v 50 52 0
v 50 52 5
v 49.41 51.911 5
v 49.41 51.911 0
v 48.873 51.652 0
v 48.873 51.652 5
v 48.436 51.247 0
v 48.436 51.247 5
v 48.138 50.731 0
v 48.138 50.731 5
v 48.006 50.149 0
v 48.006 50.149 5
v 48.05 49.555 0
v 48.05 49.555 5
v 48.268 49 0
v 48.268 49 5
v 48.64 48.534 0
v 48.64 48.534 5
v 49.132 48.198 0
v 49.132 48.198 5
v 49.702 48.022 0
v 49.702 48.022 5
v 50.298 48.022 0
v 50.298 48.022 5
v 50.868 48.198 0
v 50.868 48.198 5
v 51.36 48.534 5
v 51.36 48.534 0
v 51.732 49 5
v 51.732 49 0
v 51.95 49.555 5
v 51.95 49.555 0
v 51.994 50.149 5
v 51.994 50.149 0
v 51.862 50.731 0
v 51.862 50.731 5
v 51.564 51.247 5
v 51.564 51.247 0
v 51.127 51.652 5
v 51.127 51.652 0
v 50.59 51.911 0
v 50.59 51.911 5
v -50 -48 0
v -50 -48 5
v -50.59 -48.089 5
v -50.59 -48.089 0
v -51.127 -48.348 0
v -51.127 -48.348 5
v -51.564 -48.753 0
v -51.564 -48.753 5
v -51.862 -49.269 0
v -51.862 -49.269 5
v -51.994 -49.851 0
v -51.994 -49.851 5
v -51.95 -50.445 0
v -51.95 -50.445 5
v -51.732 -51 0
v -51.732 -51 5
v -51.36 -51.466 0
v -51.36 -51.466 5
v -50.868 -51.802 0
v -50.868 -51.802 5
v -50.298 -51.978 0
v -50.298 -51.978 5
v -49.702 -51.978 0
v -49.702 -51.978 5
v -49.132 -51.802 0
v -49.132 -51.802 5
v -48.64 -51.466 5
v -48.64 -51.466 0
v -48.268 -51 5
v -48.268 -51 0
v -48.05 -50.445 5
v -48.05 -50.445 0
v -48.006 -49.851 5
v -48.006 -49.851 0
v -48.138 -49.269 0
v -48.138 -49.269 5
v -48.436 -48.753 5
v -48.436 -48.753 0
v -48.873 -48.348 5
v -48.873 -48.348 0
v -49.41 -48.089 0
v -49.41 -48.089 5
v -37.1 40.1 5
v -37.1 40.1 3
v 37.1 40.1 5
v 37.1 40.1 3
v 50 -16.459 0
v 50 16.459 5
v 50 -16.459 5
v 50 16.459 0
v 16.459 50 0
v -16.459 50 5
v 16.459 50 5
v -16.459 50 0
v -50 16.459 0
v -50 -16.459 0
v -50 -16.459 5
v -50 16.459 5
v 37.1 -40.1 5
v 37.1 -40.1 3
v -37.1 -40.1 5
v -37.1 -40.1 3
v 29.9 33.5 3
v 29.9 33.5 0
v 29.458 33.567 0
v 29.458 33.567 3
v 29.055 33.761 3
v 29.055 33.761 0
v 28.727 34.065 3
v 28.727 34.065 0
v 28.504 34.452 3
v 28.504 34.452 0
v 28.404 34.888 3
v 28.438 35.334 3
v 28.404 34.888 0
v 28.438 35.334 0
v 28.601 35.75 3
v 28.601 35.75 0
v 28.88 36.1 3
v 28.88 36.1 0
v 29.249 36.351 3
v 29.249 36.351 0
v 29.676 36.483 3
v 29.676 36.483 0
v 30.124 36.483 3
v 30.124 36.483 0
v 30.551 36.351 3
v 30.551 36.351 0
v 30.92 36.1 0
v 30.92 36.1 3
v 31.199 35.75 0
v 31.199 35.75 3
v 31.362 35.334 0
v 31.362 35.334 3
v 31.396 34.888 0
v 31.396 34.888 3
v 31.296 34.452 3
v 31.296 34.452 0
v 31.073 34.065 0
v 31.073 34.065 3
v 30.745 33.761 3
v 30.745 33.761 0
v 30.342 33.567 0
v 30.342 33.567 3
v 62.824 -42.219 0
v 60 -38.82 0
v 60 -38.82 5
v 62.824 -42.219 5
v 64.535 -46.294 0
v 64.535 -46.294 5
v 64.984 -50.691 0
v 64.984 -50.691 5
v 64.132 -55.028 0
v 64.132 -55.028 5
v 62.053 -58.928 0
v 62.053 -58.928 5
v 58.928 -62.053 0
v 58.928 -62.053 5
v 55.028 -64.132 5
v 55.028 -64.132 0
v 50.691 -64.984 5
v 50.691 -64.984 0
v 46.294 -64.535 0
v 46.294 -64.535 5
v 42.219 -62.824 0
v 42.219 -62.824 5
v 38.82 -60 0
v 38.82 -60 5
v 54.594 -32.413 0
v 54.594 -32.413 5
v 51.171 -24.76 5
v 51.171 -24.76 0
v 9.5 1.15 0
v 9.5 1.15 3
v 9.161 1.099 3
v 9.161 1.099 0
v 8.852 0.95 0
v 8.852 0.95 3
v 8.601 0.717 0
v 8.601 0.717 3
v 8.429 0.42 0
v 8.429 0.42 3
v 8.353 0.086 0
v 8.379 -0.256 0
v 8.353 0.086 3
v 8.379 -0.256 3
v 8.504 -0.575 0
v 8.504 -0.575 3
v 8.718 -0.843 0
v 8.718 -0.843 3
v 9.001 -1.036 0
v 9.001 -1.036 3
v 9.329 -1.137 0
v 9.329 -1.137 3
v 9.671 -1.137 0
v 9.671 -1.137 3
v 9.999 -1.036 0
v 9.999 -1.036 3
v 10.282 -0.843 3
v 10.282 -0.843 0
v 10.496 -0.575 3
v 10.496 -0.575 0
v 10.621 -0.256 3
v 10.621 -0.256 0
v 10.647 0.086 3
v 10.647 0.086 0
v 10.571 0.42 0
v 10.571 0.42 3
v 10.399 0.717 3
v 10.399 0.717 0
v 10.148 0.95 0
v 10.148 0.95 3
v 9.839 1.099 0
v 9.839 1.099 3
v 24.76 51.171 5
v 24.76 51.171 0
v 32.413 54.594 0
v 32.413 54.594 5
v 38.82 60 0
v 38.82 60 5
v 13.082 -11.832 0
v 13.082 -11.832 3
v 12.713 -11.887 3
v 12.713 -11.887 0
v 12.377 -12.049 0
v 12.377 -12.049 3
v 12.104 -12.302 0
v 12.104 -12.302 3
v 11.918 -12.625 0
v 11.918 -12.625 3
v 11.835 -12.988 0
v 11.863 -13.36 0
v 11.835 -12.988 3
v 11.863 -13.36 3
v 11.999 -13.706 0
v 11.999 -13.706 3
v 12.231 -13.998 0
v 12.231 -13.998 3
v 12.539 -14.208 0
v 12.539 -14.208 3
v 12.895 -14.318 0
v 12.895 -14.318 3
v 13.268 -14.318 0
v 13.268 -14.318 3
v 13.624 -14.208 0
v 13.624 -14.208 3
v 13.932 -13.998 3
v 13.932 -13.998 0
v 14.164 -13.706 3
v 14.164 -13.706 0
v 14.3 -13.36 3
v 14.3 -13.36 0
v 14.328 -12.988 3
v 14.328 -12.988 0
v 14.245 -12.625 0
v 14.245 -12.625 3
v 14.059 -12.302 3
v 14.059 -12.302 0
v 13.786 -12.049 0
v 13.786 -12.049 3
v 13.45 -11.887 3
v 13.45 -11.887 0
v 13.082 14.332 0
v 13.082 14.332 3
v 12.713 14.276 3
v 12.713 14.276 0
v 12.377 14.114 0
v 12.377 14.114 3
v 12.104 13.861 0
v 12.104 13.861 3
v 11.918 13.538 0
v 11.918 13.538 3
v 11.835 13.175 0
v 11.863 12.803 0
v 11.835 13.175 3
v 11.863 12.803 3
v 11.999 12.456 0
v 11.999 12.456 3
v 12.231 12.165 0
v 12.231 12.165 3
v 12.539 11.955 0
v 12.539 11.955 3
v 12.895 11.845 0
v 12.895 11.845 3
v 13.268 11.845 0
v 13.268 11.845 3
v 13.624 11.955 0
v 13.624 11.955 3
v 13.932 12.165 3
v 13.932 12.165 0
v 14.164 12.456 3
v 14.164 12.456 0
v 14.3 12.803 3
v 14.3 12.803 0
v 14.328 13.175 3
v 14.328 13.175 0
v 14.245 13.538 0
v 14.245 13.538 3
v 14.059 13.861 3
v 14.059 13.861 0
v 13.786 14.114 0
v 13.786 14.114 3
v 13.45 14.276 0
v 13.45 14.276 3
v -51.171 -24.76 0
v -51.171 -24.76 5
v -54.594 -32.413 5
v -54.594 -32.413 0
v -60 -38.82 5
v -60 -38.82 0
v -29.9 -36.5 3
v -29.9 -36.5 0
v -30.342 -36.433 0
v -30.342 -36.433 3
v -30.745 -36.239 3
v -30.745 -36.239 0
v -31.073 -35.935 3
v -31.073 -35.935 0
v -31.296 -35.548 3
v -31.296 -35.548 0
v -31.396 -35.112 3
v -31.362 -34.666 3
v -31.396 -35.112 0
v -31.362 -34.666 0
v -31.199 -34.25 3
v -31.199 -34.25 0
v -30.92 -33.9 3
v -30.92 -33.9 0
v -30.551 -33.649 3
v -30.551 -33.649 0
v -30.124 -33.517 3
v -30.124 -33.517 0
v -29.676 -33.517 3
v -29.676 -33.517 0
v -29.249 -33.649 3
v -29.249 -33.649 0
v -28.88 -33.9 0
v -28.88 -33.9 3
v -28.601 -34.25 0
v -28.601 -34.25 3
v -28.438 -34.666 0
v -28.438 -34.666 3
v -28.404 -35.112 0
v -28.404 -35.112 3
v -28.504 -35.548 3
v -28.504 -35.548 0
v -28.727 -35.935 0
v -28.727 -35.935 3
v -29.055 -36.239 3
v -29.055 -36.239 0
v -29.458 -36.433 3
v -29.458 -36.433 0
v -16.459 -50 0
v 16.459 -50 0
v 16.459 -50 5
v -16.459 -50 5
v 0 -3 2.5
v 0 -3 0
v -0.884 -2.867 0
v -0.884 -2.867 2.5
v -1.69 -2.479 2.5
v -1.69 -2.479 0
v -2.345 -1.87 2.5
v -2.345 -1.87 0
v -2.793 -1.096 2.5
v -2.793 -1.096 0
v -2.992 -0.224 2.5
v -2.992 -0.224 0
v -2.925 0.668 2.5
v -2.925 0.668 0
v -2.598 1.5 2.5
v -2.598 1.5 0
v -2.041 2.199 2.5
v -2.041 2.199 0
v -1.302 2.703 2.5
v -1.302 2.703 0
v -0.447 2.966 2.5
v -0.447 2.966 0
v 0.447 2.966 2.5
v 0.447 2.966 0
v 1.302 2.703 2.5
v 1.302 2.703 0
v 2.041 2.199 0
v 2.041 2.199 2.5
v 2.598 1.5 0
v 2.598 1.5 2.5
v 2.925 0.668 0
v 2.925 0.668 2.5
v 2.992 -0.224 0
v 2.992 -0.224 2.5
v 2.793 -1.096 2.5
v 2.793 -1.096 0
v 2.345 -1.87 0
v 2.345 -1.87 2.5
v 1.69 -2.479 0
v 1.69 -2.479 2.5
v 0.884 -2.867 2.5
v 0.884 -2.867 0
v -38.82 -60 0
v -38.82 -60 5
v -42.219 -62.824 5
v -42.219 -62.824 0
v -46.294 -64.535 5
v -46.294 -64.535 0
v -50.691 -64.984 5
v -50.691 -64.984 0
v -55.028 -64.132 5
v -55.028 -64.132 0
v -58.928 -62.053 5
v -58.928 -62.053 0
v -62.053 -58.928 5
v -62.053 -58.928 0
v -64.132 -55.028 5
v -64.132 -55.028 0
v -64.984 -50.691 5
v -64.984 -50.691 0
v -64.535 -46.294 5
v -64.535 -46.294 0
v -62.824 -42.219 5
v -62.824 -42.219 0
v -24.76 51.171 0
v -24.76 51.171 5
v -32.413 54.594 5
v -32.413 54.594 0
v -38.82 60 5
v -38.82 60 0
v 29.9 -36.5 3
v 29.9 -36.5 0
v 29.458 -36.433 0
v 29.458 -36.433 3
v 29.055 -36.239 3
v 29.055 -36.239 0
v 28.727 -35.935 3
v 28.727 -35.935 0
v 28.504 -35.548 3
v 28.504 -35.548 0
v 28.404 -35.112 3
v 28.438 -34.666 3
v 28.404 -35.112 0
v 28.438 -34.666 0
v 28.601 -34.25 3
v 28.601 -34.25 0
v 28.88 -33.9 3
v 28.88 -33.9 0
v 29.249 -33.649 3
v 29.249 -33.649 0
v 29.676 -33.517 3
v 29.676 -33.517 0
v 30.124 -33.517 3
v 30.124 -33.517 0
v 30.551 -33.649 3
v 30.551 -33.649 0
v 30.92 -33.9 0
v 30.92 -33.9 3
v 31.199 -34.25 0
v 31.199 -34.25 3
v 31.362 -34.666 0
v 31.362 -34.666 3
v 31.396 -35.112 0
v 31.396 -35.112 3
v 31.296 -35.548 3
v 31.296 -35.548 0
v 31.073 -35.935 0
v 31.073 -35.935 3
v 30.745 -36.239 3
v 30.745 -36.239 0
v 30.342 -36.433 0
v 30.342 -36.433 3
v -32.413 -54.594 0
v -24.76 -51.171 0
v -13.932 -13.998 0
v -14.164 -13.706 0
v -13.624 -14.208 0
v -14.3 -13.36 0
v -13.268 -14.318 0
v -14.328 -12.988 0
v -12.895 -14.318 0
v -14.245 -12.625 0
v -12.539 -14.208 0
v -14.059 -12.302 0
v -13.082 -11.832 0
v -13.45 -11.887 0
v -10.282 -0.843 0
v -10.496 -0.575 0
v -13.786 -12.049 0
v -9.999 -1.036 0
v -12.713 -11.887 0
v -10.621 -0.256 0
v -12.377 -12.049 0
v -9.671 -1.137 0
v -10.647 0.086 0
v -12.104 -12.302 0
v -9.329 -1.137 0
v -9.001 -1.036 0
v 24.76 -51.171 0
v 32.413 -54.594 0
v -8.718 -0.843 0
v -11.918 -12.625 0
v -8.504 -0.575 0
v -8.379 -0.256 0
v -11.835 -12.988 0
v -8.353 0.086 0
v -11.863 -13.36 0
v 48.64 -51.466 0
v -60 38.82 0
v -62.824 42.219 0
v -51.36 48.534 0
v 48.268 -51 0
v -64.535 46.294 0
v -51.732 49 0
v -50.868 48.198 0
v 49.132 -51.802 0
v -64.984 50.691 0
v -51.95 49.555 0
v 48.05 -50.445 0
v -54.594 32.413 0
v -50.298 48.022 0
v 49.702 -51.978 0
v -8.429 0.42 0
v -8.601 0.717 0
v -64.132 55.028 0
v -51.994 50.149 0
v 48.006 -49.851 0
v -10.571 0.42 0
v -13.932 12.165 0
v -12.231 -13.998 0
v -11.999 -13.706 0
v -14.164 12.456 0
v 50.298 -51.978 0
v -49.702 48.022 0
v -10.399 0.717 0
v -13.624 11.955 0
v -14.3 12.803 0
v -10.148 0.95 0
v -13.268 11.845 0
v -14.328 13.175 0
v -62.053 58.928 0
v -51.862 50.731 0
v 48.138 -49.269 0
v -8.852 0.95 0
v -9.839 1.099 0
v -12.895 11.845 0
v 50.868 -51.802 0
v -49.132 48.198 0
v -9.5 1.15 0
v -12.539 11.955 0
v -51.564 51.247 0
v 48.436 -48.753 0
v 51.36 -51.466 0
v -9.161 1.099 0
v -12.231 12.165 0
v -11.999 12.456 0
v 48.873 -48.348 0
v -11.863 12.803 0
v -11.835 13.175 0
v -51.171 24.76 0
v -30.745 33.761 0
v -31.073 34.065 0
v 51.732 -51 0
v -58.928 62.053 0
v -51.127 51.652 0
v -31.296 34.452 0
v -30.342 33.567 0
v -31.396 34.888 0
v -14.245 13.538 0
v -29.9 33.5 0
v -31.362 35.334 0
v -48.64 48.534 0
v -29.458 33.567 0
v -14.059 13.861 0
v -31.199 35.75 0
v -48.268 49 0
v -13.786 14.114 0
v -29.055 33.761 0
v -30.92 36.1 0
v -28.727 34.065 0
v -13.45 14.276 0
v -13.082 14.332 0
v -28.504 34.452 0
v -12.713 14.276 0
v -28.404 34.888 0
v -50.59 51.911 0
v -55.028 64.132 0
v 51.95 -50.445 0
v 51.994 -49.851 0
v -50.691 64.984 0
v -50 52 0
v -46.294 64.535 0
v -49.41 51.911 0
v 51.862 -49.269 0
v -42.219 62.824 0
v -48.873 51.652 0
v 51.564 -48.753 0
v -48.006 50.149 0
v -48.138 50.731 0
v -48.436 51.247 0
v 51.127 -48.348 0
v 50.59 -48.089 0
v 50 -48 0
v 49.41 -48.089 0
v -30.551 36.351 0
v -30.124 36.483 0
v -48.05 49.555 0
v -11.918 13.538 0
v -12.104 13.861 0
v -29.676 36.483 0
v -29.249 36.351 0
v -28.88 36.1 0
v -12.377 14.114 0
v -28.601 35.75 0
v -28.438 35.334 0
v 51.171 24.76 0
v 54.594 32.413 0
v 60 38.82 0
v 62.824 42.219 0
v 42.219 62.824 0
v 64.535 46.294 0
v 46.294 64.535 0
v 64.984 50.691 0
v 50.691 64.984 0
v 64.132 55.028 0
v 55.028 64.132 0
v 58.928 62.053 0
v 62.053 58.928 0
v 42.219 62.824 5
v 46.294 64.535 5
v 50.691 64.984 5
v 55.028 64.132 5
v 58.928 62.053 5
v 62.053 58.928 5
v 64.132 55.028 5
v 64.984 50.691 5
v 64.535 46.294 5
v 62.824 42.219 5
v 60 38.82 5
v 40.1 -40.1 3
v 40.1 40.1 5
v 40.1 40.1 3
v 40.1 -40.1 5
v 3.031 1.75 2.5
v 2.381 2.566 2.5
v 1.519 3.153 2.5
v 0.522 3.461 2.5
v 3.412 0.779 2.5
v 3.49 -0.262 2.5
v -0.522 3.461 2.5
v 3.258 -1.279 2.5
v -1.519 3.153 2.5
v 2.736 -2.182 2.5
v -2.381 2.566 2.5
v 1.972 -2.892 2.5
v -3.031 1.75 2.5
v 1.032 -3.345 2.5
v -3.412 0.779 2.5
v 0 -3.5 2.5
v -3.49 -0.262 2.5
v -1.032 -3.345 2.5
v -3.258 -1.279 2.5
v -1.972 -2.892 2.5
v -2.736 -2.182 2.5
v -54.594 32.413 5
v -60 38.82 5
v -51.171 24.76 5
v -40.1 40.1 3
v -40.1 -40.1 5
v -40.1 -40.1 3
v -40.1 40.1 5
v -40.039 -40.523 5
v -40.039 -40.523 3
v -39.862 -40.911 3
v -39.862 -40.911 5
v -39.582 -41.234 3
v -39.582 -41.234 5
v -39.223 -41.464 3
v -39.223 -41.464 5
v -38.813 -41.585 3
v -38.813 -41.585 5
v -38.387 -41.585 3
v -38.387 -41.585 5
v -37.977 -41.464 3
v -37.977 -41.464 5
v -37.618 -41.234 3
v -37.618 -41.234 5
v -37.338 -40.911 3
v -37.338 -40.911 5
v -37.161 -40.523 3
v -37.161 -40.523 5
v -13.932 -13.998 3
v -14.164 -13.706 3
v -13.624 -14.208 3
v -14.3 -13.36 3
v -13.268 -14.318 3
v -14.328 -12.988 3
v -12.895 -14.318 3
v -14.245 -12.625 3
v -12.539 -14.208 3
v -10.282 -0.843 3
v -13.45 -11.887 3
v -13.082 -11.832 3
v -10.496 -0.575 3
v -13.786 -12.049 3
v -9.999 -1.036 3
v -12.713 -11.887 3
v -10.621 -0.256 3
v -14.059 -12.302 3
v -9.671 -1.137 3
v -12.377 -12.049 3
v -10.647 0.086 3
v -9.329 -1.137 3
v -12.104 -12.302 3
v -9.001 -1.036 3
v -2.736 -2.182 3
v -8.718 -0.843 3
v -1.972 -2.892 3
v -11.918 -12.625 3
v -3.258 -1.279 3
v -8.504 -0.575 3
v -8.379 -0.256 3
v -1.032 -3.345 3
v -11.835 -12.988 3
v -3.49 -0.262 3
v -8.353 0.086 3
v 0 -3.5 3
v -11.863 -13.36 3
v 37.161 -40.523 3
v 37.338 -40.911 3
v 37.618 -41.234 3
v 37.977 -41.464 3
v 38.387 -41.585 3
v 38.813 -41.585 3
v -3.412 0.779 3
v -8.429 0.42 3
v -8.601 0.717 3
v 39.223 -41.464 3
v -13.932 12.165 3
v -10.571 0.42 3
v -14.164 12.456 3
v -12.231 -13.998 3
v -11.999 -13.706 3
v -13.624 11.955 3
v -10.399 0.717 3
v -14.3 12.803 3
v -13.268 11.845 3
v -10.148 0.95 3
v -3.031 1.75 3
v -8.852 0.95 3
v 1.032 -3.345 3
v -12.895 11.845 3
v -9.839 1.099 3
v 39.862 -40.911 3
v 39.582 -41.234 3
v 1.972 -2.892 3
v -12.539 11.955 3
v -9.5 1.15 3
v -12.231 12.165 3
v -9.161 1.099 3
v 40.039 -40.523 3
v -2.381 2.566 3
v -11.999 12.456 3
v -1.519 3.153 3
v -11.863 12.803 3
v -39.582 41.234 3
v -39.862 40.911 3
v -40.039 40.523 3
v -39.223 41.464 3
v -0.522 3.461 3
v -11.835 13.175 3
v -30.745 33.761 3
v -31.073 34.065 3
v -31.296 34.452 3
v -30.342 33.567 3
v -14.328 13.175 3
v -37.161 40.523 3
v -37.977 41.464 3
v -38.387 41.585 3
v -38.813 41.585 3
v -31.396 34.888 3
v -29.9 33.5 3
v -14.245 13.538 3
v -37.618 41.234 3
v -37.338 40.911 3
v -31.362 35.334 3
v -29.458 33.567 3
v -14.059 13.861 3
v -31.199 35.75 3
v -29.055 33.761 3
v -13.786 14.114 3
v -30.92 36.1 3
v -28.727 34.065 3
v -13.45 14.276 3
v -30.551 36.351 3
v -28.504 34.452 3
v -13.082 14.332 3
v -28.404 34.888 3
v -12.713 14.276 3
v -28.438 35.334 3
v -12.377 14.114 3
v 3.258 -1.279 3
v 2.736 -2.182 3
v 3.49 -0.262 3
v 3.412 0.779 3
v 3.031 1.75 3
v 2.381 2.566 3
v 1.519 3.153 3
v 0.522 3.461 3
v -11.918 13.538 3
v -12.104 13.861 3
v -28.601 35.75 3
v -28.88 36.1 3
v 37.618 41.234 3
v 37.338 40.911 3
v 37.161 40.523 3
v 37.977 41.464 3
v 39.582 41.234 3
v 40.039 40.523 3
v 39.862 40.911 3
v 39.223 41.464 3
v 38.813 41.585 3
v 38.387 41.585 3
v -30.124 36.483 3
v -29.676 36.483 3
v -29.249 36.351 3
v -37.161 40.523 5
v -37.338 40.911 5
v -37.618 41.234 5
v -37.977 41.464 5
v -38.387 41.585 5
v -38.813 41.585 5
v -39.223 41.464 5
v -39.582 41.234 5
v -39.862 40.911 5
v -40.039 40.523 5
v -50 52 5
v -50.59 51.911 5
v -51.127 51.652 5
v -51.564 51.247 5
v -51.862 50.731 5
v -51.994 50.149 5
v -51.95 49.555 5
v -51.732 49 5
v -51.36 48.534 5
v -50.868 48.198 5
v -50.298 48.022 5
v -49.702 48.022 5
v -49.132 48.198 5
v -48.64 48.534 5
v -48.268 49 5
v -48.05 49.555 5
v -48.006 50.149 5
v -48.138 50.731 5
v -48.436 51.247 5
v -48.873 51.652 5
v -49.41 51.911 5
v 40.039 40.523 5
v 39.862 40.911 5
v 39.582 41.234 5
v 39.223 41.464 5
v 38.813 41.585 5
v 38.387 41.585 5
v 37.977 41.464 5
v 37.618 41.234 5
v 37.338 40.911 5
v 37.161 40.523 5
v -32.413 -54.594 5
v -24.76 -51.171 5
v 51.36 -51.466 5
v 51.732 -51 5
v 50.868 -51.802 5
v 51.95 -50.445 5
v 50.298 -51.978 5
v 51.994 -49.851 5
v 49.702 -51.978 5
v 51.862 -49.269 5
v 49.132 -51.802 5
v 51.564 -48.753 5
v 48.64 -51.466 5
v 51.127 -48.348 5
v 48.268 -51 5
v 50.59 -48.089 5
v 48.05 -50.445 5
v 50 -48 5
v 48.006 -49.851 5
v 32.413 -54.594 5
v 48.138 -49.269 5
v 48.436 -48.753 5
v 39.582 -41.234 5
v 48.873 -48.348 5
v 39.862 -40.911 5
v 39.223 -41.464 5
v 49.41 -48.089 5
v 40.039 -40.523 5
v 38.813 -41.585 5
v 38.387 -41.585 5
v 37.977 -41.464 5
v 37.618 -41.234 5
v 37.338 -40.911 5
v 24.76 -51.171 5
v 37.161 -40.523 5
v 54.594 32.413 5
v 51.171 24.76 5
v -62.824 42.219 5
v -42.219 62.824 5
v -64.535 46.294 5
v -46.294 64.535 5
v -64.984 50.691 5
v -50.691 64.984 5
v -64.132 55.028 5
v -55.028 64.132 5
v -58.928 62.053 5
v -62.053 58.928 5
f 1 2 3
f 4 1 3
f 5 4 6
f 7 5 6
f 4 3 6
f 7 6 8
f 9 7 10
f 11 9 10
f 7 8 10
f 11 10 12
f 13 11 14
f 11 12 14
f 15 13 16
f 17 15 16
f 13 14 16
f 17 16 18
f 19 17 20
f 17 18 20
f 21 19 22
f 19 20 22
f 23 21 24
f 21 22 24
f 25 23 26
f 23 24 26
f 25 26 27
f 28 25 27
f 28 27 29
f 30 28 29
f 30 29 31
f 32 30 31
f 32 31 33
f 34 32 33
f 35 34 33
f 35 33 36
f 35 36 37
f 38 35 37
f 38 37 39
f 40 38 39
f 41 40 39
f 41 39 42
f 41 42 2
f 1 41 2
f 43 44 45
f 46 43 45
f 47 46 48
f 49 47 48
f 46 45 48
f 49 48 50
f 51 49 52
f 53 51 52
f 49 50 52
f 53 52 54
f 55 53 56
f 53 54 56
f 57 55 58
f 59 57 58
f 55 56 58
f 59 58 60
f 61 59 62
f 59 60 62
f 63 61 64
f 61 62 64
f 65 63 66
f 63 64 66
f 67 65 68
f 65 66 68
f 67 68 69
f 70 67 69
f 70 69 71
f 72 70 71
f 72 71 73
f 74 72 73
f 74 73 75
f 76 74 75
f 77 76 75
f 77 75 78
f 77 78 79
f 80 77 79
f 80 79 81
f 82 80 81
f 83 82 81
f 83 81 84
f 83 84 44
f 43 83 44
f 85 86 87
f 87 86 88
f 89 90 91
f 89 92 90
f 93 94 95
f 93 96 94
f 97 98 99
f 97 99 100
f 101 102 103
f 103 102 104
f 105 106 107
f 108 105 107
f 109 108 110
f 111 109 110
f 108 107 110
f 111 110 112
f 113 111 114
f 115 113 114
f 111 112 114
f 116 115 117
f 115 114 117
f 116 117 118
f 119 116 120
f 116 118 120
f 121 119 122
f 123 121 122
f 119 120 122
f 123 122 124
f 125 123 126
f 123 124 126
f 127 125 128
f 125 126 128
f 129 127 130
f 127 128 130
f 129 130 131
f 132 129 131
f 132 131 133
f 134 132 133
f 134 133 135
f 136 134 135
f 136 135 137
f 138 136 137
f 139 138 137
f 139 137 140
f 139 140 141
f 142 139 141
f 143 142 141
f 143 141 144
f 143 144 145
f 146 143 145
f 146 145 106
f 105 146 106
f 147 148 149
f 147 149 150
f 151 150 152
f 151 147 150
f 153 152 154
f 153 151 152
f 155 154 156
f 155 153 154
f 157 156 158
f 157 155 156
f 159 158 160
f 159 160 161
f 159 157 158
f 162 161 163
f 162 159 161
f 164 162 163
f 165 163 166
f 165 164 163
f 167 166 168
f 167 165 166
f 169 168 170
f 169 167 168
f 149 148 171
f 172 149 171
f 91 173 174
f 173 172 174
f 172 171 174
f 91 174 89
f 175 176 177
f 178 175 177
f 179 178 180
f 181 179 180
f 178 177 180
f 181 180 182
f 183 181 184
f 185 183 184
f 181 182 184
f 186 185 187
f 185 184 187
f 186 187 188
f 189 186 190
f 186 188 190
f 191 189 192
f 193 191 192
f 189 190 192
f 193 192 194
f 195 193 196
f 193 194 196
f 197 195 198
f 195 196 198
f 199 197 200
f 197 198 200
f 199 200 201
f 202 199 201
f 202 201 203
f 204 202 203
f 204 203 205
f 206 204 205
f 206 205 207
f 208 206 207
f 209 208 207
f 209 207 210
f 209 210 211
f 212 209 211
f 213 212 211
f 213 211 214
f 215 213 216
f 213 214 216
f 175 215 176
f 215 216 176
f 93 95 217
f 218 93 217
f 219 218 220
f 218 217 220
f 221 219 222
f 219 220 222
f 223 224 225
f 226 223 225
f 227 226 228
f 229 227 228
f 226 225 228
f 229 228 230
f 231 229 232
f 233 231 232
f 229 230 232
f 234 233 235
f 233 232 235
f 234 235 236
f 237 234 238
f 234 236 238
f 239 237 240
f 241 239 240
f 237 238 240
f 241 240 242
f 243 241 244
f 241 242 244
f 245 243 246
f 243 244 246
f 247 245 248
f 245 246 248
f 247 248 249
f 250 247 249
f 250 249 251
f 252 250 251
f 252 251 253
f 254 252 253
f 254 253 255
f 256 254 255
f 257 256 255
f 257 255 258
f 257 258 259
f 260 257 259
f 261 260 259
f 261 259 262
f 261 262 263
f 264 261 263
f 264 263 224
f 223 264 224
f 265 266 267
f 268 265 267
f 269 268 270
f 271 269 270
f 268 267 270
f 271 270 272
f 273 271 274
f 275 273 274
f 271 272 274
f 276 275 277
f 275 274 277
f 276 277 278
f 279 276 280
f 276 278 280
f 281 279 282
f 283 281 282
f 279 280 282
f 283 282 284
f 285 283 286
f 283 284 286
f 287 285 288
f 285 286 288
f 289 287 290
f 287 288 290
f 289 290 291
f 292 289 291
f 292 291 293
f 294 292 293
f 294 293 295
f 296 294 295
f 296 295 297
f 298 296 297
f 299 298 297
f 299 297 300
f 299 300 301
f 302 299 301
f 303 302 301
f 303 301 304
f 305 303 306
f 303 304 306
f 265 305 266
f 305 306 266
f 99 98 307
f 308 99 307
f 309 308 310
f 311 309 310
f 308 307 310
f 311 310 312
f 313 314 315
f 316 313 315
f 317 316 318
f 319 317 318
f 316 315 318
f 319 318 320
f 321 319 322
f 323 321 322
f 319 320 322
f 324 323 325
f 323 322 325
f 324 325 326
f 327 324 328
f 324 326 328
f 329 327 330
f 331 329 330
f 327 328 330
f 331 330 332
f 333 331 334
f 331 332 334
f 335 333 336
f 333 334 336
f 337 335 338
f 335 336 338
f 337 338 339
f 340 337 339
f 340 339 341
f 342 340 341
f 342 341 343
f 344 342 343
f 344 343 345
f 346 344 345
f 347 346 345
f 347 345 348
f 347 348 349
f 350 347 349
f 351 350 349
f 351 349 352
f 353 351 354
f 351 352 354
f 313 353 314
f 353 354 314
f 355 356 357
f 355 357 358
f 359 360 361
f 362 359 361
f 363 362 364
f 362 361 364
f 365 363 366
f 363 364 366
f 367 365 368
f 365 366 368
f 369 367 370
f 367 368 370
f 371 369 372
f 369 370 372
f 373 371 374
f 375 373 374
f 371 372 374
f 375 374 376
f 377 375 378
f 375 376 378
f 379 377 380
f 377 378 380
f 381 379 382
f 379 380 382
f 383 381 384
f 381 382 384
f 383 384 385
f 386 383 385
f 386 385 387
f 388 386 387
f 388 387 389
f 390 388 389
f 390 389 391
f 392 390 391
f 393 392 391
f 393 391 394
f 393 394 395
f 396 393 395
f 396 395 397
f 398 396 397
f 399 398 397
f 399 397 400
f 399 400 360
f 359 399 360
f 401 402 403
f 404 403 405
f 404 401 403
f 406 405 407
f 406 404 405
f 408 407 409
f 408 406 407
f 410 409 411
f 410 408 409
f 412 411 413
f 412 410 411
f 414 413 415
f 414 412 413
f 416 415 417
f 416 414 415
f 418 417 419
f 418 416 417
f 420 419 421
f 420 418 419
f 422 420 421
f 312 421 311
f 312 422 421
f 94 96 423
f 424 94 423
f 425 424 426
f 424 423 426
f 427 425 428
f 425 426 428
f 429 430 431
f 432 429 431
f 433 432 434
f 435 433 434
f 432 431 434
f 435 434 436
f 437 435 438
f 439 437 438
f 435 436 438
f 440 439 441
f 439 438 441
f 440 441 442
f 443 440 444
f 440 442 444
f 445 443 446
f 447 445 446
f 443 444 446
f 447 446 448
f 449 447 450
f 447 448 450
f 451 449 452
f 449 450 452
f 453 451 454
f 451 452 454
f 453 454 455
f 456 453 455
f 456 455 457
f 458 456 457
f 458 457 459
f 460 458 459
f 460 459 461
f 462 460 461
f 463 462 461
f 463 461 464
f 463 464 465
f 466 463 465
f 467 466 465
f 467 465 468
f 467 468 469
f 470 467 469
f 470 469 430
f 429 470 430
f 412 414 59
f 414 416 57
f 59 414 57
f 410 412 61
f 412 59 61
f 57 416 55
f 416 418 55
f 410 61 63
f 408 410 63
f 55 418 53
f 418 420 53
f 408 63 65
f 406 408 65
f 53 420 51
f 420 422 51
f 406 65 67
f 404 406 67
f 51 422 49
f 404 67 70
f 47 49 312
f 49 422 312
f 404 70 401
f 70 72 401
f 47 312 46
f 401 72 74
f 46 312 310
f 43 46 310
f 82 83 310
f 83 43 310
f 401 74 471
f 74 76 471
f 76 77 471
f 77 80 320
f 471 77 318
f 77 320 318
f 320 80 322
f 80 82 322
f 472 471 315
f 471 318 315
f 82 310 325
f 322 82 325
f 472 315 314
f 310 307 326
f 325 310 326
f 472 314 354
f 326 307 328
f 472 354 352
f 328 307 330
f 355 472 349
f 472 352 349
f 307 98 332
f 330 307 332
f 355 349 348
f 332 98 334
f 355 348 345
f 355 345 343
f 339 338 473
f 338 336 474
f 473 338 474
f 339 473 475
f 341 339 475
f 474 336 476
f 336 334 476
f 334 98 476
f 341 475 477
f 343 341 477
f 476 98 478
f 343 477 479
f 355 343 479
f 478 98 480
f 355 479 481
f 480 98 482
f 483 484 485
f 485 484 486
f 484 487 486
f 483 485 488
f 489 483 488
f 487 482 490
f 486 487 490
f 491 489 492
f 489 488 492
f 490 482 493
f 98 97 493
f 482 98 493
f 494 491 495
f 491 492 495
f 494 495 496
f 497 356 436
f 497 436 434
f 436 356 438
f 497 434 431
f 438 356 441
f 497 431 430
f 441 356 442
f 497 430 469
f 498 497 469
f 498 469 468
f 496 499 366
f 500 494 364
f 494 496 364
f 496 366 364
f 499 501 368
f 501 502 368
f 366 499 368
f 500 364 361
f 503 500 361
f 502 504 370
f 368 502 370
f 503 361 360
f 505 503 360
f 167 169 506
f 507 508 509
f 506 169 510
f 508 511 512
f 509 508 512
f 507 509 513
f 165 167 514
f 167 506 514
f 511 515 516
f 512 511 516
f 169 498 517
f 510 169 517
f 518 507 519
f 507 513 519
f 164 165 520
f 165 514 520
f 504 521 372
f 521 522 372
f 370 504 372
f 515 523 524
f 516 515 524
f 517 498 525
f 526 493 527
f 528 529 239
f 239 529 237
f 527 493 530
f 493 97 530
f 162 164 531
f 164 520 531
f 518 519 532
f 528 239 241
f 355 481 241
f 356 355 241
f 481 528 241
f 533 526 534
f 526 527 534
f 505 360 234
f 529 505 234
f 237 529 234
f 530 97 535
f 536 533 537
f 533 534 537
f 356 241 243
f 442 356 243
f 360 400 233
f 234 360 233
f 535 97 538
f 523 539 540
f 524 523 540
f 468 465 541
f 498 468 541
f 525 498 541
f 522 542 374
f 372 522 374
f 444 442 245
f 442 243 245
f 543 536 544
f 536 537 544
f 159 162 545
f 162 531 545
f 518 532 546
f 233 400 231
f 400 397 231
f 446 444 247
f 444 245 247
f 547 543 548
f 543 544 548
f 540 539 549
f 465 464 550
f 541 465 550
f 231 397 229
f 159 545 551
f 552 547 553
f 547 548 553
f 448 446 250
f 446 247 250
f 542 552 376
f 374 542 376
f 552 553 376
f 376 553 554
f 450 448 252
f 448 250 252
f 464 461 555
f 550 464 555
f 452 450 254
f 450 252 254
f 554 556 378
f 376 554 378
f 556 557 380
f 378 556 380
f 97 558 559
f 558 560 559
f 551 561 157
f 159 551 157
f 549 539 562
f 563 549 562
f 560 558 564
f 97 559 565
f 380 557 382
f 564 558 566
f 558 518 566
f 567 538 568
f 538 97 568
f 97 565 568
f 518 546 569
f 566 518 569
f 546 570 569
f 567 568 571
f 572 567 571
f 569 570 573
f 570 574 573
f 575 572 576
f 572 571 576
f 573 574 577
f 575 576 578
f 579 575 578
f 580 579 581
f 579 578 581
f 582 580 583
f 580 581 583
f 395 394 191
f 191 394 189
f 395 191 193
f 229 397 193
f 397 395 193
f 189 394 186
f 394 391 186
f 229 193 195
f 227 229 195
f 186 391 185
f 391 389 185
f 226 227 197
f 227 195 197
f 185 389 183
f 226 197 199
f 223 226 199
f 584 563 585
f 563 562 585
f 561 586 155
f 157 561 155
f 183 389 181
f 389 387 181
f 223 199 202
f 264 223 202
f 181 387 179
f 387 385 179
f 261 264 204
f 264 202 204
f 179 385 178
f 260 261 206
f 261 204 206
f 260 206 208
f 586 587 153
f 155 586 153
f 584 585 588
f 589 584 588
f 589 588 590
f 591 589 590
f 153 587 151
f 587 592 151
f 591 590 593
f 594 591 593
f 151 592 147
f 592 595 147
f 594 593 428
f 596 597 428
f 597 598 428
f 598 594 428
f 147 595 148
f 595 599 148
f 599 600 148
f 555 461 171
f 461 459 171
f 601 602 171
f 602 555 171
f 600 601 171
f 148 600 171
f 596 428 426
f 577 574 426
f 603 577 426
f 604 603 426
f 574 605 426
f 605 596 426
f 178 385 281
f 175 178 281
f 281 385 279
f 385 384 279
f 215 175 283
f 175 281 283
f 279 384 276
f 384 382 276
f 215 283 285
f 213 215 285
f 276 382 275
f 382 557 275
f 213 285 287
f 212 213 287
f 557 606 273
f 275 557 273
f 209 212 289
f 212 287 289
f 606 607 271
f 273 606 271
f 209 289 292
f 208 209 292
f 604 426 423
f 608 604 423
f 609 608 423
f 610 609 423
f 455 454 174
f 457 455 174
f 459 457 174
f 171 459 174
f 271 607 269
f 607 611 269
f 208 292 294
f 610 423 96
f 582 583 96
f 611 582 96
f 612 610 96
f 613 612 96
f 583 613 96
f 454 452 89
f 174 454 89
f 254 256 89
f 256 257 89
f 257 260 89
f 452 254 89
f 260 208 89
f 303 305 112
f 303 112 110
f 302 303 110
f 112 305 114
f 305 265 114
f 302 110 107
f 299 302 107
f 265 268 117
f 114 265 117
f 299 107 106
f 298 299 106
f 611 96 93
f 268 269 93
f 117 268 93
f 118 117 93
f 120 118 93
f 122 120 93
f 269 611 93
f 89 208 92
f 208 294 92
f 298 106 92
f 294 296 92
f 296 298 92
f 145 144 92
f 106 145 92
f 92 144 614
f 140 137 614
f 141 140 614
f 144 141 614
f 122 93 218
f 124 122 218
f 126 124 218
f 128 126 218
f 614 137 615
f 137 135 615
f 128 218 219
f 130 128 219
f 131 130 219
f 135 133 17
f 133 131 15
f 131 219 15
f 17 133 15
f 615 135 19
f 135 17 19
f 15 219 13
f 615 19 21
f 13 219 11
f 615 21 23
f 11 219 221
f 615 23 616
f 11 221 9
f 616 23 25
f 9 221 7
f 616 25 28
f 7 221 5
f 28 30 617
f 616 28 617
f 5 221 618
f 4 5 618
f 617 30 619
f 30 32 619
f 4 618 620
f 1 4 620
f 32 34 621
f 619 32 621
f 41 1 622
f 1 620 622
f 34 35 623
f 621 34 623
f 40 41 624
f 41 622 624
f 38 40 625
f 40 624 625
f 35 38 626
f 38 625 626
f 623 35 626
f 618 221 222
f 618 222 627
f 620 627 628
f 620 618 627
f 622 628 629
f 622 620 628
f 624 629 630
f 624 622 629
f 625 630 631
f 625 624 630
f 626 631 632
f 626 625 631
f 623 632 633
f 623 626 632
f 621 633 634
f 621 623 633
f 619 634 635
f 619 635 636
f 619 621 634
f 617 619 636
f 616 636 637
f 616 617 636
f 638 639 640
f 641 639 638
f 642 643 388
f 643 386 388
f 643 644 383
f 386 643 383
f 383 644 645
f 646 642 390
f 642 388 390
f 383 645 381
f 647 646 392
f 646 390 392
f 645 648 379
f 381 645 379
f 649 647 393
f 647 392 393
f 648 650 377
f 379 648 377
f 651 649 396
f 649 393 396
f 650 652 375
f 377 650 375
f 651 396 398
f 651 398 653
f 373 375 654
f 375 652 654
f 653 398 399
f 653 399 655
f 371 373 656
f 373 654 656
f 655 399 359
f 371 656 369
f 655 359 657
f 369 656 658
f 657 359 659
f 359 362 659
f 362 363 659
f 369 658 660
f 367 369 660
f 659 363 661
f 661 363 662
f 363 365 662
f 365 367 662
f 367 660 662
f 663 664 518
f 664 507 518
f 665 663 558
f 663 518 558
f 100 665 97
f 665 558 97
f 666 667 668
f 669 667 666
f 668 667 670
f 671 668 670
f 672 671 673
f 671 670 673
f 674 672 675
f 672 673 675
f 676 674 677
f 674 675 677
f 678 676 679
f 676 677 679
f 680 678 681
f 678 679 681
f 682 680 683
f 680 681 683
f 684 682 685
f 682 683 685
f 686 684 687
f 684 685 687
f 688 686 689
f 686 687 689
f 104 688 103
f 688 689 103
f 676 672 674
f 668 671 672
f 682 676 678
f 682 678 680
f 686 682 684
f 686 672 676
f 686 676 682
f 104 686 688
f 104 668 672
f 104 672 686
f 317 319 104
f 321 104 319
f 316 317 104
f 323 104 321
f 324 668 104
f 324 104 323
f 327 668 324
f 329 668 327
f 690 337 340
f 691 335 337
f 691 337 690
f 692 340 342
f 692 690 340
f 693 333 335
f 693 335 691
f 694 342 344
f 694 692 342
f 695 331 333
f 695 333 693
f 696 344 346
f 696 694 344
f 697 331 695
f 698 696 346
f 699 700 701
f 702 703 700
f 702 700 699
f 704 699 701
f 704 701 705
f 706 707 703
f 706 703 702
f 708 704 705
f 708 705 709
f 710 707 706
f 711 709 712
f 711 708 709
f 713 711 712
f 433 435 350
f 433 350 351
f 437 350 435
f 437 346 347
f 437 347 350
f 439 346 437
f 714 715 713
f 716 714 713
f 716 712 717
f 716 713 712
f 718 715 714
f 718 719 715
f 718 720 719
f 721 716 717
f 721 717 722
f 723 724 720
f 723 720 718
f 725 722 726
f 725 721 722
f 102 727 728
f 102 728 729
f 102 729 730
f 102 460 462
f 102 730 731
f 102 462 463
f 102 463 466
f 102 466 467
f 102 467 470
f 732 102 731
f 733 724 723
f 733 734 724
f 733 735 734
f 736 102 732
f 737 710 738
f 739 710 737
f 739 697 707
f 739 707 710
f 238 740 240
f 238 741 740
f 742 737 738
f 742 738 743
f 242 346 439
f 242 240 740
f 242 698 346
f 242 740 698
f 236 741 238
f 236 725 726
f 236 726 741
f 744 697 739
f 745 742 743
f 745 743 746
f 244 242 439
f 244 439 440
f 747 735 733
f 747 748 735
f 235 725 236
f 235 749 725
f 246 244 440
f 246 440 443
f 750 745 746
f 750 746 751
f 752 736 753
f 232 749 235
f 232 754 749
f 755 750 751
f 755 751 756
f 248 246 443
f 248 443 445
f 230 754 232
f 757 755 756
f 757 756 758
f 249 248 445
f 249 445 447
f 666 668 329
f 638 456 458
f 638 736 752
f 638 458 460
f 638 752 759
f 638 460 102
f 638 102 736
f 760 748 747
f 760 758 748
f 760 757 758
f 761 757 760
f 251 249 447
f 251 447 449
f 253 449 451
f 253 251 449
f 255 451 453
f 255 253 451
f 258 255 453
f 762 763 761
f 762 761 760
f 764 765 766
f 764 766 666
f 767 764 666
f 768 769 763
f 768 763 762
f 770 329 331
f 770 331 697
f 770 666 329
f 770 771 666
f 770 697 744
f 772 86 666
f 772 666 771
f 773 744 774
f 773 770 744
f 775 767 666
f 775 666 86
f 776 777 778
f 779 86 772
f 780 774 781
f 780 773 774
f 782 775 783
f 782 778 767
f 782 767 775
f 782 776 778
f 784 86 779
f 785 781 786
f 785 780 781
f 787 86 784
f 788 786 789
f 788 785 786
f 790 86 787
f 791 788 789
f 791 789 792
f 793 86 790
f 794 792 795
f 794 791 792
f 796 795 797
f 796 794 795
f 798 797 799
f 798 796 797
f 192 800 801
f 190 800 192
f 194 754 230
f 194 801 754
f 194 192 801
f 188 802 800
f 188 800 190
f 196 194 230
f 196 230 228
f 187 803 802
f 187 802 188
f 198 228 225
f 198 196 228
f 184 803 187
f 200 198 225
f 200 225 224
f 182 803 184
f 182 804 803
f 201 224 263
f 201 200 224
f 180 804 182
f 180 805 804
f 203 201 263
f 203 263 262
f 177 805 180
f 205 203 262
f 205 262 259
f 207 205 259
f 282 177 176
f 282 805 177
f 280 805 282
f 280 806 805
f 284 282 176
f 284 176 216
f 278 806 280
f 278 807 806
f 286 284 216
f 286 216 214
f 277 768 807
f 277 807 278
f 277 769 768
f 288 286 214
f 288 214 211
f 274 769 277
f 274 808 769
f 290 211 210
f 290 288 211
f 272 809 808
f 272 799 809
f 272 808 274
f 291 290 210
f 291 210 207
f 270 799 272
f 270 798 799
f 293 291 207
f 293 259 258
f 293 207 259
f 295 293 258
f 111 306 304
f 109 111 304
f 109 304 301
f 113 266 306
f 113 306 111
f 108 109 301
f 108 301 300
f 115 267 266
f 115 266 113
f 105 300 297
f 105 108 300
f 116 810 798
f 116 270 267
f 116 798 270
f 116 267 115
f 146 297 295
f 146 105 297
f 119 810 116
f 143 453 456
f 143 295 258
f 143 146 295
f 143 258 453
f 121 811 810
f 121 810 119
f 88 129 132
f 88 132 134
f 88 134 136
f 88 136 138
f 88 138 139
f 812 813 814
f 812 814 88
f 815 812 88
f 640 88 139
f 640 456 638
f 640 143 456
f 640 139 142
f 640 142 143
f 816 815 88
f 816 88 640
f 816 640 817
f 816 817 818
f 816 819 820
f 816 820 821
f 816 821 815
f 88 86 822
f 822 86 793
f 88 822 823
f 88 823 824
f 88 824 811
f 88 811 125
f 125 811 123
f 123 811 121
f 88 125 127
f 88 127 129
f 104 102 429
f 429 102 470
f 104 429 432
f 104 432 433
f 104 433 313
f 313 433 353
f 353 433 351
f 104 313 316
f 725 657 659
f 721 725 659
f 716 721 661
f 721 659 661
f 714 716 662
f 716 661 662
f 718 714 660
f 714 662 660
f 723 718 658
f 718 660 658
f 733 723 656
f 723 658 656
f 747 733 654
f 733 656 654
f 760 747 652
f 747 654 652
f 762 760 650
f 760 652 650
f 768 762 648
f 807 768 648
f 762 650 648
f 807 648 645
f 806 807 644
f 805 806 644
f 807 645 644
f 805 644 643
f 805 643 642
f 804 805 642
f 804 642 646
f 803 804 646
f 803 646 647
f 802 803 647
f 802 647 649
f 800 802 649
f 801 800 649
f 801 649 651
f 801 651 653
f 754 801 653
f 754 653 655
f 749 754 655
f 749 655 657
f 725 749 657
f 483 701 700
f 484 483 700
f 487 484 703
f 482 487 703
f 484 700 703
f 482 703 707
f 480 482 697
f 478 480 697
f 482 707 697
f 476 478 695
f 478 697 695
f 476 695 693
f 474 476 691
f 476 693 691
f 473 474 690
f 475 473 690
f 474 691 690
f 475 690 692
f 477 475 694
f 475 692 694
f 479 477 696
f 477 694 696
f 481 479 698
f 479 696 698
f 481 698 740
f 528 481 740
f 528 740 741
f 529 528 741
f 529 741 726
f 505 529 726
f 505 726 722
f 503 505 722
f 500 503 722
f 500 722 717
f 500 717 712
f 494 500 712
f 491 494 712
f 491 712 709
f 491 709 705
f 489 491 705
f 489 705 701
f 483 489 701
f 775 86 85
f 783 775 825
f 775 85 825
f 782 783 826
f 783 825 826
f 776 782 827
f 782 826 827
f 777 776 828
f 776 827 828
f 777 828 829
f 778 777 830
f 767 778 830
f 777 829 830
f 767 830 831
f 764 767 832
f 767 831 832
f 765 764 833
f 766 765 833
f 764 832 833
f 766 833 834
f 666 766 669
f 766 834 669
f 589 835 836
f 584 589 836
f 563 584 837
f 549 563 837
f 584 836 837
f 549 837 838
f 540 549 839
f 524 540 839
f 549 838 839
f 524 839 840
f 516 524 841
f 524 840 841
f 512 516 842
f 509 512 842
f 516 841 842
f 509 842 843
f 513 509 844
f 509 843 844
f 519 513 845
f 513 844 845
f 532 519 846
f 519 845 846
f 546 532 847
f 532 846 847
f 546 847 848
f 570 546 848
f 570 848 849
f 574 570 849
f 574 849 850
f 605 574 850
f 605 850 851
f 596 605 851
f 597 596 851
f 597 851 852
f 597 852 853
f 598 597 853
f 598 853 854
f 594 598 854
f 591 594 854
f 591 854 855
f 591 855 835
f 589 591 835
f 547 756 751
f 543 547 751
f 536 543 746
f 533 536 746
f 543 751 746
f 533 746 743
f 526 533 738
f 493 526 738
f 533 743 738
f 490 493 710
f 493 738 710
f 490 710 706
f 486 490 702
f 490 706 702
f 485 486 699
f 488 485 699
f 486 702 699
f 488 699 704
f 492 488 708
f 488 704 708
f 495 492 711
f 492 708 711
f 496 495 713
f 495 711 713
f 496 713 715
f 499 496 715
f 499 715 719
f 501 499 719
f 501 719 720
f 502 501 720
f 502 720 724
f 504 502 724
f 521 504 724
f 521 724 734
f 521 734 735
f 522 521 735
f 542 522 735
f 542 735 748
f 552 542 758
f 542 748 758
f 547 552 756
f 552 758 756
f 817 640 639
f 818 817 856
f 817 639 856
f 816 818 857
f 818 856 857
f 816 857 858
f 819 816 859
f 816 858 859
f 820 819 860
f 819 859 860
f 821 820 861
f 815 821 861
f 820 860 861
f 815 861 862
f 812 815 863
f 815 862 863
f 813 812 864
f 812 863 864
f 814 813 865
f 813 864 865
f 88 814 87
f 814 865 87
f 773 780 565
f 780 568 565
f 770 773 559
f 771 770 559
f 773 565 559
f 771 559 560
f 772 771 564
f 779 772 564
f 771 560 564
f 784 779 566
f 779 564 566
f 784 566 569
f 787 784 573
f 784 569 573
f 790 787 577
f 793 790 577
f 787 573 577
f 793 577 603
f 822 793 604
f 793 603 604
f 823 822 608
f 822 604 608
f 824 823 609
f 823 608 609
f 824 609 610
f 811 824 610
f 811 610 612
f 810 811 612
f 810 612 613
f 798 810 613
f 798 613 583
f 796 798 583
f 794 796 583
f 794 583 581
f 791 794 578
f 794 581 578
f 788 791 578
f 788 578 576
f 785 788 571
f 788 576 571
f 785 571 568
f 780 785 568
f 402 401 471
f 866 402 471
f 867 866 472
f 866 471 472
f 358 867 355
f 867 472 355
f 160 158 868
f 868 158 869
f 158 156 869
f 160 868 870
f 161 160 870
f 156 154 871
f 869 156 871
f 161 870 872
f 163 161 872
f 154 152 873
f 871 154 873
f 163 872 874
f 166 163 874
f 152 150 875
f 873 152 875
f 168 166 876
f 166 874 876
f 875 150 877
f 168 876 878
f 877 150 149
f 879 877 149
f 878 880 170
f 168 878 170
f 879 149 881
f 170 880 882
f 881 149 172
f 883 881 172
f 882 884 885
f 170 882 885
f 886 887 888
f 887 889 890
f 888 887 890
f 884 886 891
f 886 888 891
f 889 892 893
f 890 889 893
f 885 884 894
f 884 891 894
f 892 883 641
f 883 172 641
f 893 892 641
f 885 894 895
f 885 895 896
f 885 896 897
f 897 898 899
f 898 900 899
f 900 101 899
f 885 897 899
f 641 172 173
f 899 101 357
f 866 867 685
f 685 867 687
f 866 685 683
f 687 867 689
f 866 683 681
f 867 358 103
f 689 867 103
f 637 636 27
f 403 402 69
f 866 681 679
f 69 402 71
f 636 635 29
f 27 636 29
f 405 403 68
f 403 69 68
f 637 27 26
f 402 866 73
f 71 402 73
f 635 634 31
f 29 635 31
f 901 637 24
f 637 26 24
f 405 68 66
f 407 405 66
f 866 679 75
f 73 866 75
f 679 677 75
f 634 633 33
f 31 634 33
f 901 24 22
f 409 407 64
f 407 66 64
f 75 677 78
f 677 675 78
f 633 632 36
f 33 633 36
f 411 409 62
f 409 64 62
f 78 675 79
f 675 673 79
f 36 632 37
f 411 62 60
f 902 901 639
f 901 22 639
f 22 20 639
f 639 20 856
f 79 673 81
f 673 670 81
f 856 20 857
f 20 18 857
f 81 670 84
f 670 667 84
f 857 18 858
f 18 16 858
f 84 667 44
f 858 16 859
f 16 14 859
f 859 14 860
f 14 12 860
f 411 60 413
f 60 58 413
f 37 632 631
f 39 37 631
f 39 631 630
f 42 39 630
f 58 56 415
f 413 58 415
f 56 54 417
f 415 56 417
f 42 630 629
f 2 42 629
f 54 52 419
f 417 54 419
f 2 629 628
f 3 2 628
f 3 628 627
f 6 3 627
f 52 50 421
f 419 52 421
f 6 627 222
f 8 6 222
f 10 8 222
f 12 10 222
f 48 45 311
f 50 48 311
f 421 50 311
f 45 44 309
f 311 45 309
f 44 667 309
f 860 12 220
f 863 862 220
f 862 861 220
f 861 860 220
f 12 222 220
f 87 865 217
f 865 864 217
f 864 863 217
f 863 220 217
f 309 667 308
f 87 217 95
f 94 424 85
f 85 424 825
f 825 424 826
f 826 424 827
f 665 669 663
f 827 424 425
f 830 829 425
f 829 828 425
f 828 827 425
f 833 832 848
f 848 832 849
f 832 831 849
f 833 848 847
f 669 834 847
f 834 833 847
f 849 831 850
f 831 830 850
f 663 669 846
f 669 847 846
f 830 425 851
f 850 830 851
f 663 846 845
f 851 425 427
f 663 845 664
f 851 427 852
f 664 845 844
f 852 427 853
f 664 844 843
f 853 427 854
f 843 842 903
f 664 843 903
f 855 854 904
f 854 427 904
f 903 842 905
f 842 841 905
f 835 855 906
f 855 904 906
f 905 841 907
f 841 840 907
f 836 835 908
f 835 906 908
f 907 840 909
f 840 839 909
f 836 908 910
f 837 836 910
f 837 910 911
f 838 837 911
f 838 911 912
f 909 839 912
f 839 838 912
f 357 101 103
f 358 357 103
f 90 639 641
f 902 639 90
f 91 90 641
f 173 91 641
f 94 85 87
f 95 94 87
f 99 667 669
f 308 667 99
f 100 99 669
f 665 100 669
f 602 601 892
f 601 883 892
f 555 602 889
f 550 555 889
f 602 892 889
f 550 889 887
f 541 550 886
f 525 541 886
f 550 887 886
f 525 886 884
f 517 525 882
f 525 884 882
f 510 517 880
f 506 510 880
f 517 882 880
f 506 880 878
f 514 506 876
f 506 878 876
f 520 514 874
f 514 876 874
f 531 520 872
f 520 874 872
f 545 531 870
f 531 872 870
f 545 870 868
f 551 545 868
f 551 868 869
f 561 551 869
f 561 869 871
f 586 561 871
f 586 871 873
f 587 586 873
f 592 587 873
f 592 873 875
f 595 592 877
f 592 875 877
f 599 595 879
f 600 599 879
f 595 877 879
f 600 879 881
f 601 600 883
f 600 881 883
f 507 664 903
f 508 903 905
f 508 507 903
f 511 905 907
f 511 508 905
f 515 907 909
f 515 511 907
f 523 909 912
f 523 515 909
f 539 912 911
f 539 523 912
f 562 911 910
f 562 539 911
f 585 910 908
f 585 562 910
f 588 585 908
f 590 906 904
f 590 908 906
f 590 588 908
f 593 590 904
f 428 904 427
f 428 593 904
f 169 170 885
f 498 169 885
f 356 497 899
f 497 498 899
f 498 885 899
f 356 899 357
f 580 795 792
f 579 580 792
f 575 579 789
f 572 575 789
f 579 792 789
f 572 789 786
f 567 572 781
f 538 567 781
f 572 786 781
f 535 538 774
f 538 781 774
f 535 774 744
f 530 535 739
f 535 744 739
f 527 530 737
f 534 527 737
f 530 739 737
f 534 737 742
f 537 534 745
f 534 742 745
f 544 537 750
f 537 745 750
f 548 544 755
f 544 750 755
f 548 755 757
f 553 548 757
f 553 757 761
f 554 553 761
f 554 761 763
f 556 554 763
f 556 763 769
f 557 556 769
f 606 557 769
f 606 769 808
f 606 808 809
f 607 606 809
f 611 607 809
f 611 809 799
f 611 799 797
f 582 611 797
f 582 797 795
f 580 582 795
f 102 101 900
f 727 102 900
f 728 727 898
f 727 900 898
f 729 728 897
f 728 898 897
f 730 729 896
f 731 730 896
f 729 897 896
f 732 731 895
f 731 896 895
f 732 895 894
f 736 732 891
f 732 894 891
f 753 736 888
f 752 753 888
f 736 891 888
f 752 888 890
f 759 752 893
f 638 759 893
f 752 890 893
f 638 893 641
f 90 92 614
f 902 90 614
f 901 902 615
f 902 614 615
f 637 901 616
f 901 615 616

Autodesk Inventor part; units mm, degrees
ref_plane "YZ Plane" through (0, 0, 0) normal (1, 0, 0) x (0, 1, 0)
ref_plane "XZ Plane" through (0, 0, 0) normal (0, 1, 0) x (-1, 0, 0)
ref_plane "XY Plane" through (0, 0, 0) normal (0, 0, 1) x (1, 0, 0)
sketch "スケッチ1" plane through (0, 0, 0) normal (0, 0, 1) x (1, 0, 0)
  line L0 (-50, 50) -> (50, 50)
  line L1 (50, 50) -> (50, -50)
  line L2 (50, -50) -> (-50, -50)
  line L3 (-50, -50) -> (-50, 50)
  point P0 (0, 0)
  dimension "d0" = 100
  dimension "d1" = 100
  dimension "d2" = 50
  dimension "d3" = 50
extrude "押し出し1" add sketch "スケッチ1" along normal blind 3
sketch "スケッチ2" plane through (0, 0, 3) normal (0, 0, 1) x (1, 0, 0)
  point P0 (0, 0)
  point P1 (0, 0)
hole "Hole1" at (0, 0, 3) direction (0, 0, -1) diameter 6 end through all counterbore diameter 7 counterbore depth 0.5
sketch "スケッチ3" plane through (0, 0, 3) normal (0, 0, 1) x (1, 0, 0)
  circle A0 centre (0, 0) radius 3.5 projected
  line L0 (50, 50) -> (50, -50) projected
  line L1 (-50, 50) -> (50, 50) projected
  line L2 (-50, -50) -> (-50, 50) projected
  line L3 (50, -50) -> (-50, -50) projected
  line L4 (-40.1, 40.1) -> (40.1, 40.1)
  line L5 (40.1, 40.1) -> (40.1, -40.1)
  line L6 (40.1, -40.1) -> (-40.1, -40.1)
  line L7 (-40.1, -40.1) -> (-40.1, 40.1)
  dimension "d13" = 80.2
  dimension "d14" = 80.2
  dimension "d15" = 40.1
  dimension "d16" = 40.1
extrude "押し出し2" add sketch "スケッチ3" along normal blind 2 contours L0 L3 L2 L1
sketch "スケッチ4" plane through (0, 0, 3) normal (0, 0, 1) x (1, 0, 0)
  circle A0 centre (0, 0) radius 3.5 projected
  point P0 (-29.9, 35)
  point P1 (-29.9, -35)
  point P2 (29.9, -35)
  point P3 (29.9, 35)
  dimension "d19" = 59.8
  dimension "d20" = 59.8
  dimension "d21" = 70
  dimension "d22" = 70
  dimension "d23" = 29.9
  dimension "d24" = 29.9
  dimension "d25" = 35
hole "Hole2" at (29.9, -35, 3) at (-29.9, -35, 3) at (29.9, 35, 3) at (-29.9, 35, 3) direction (0, 0, -1) diameter 3 depth 8 tip angle 118
sketch "スケッチ5" plane through (0, 0, 0) normal (0, 0, -1) x (-1, 0, 0)
  circle A0 centre (-50, -50) radius 15
  circle A1 centre (-50, 50) radius 15
  circle A2 centre (50, -50) radius 15
  circle A3 centre (50, 50) radius 15
  dimension "d33" = 30
  dimension "d34" = 30
  dimension "d35" = 30
  dimension "d36" = 30
extrude "押し出し3" add sketch "スケッチ5" against normal blind 5
fillet "フィレット1" radius 30 8 edges at (-35, 50, 2.5) (-50, 35, 2.5) (35, 50, 2.5) (50, 35, 2.5) (50, -35, 2.5) (35, -50, 2.5) (-35, -50, 2.5) (-50, -35, 2.5)
sketch "スケッチ6" plane through (0, 0, 0) normal (0, 0, -1) x (-1, 0, 0)
  arc A0 (60, 38.8197) -> (38.8197, 60) centre (50, 50) ccw projected
  arc A1 (-38.8197, 60) -> (-60, 38.8197) centre (-50, 50) ccw projected
  arc A2 (-60, -38.8197) -> (-38.8197, -60) centre (-50, -50) ccw projected
  arc A3 (38.8197, -60) -> (60, -38.8197) centre (50, -50) ccw projected
hole "Hole3" at (-50, -50, 0) at (50, -50, 0) at (50, 50, 0) at (-50, 50, 0) direction (0, 0, 1) diameter 4 depth 8 tip angle 118
sketch "スケッチ7" plane through (0, 0, 5) normal (0, 0, 1) x (1, 0, 0)
  arc A0 (-38.731, -40.1) -> (-40.1, -38.731) centre (-50, -50) ccw projected
  line L0 (-40.1, -38.731) -> (-40.1, 38.731) projected
  arc A1 (-40.1, 38.731) -> (-38.731, 40.1) centre (-50, 50) ccw projected
  line L1 (-38.731, 40.1) -> (38.731, 40.1) projected
  arc A2 (38.731, 40.1) -> (40.1, 38.731) centre (50, 50) ccw projected
  line L2 (40.1, 38.731) -> (40.1, -38.731) projected
  arc A3 (40.1, -38.731) -> (38.731, -40.1) centre (50, -50) ccw projected
  line L3 (38.731, -40.1) -> (-38.731, -40.1) projected
  circle A4 centre (-38.6, 40.1) radius 1.5
  line L4 (38.731, 40.1) -> (-38.731, 40.1) projected
  line L5 (0, 40.1) -> (0, -40.1)
  line L6 (40.1, 0) -> (-40.1, 0)
  circle A5 centre (38.6, 40.1) radius 1.5
  circle A6 centre (-38.6, -40.1) radius 1.5
  circle A7 centre (38.6, -40.1) radius 1.5
  line L7 (-40.1, 40.1) -> (40.1, 40.1)
  line L8 (40.1, 40.1) -> (40.1, -40.1)
  line L9 (40.1, -40.1) -> (-40.1, -40.1)
  line L10 (-40.1, -40.1) -> (-40.1, 40.1)
  point P0 (0, 0)
  dimension "d47" = 3
  dimension "d48" = 1.5
extrude "押し出し4" cut sketch "スケッチ7" against normal up to surface (2 mm away) contours L9 A6 A0 | A0 A6 L3 | L3 A6 L9 | A6 L10 A0 | A7 A3 L3 | L3 L9 A7 | L10 A4 A1 | A3 A7 L9 | A3 L8 A7 | A4 L7 A1 | A1 L1 A4 | A4 L1 L7 | A5 L7 L1 | L1 A2 A5 | A2 A5 L8 | L7 A5 A2
sketch "スケッチ8" plane through (0, 0, 0) normal (0, 0, -1) x (-1, 0, 0)
  circle A0 centre (0, 0) radius 3 projected
  circle A1 centre (0, 0) radius 9.5
  point P0 (-9.5, 0)
  point P1 (9.5, 0)
  dimension "d51" = 19
hole "Hole4" at (9.5, 0, 0) at (-9.5, 0, 0) direction (0, 0, 1) diameter 2.3 depth 8 tip angle 118
sketch "スケッチ9" plane through (0, 0, 0) normal (0, 0, -1) x (-1, 0, 0)
  circle A0 centre (0, 0) radius 3 projected
  line L0 (-16.459, -50) -> (16.459, -50) projected
  circle A1 centre (0, 0) radius 18.5
  line L1 (0, 0) -> (13.0815, 13.0815)
  line L2 (18.5, 0) -> (0, 0)
  point P0 (-13.0815, 13.0815)
  point P1 (-13.0815, -13.0815)
  point P2 (13.0815, -13.0815)
  dimension "d59" = 37
  dimension "d60" = 45
  dimension "d63" = 360
hole "Hole5" at (-13.0815, 13.0815, 0) at (13.0815, 13.0815, 0) at (13.0815, -13.0815, 0) at (-13.0815, -13.0815, 0) direction (0, 0, 1) diameter 2.5 depth 8 tip angle 118
equation "\"d1\" = d0"
equation "\"d2\" = 0.5 * d0"
equation "\"d3\" = d2"
equation "\"d14\" = d13"
equation "\"d15\" = 0.5 * d13"
equation "\"d16\" = d15"
equation "\"d20\" = d19"
equation "\"d22\" = d21"
equation "\"d23\" = 0.5 * d19"
equation "\"d24\" = d23"
equation "\"d25\" = 0.5 * d21"
equation "\"d34\" = d33"
equation "\"d35\" = d33"
equation "\"d36\" = d33"
equation "\"d48\" = 0.5 * d47"
properties part number "JointA0"
